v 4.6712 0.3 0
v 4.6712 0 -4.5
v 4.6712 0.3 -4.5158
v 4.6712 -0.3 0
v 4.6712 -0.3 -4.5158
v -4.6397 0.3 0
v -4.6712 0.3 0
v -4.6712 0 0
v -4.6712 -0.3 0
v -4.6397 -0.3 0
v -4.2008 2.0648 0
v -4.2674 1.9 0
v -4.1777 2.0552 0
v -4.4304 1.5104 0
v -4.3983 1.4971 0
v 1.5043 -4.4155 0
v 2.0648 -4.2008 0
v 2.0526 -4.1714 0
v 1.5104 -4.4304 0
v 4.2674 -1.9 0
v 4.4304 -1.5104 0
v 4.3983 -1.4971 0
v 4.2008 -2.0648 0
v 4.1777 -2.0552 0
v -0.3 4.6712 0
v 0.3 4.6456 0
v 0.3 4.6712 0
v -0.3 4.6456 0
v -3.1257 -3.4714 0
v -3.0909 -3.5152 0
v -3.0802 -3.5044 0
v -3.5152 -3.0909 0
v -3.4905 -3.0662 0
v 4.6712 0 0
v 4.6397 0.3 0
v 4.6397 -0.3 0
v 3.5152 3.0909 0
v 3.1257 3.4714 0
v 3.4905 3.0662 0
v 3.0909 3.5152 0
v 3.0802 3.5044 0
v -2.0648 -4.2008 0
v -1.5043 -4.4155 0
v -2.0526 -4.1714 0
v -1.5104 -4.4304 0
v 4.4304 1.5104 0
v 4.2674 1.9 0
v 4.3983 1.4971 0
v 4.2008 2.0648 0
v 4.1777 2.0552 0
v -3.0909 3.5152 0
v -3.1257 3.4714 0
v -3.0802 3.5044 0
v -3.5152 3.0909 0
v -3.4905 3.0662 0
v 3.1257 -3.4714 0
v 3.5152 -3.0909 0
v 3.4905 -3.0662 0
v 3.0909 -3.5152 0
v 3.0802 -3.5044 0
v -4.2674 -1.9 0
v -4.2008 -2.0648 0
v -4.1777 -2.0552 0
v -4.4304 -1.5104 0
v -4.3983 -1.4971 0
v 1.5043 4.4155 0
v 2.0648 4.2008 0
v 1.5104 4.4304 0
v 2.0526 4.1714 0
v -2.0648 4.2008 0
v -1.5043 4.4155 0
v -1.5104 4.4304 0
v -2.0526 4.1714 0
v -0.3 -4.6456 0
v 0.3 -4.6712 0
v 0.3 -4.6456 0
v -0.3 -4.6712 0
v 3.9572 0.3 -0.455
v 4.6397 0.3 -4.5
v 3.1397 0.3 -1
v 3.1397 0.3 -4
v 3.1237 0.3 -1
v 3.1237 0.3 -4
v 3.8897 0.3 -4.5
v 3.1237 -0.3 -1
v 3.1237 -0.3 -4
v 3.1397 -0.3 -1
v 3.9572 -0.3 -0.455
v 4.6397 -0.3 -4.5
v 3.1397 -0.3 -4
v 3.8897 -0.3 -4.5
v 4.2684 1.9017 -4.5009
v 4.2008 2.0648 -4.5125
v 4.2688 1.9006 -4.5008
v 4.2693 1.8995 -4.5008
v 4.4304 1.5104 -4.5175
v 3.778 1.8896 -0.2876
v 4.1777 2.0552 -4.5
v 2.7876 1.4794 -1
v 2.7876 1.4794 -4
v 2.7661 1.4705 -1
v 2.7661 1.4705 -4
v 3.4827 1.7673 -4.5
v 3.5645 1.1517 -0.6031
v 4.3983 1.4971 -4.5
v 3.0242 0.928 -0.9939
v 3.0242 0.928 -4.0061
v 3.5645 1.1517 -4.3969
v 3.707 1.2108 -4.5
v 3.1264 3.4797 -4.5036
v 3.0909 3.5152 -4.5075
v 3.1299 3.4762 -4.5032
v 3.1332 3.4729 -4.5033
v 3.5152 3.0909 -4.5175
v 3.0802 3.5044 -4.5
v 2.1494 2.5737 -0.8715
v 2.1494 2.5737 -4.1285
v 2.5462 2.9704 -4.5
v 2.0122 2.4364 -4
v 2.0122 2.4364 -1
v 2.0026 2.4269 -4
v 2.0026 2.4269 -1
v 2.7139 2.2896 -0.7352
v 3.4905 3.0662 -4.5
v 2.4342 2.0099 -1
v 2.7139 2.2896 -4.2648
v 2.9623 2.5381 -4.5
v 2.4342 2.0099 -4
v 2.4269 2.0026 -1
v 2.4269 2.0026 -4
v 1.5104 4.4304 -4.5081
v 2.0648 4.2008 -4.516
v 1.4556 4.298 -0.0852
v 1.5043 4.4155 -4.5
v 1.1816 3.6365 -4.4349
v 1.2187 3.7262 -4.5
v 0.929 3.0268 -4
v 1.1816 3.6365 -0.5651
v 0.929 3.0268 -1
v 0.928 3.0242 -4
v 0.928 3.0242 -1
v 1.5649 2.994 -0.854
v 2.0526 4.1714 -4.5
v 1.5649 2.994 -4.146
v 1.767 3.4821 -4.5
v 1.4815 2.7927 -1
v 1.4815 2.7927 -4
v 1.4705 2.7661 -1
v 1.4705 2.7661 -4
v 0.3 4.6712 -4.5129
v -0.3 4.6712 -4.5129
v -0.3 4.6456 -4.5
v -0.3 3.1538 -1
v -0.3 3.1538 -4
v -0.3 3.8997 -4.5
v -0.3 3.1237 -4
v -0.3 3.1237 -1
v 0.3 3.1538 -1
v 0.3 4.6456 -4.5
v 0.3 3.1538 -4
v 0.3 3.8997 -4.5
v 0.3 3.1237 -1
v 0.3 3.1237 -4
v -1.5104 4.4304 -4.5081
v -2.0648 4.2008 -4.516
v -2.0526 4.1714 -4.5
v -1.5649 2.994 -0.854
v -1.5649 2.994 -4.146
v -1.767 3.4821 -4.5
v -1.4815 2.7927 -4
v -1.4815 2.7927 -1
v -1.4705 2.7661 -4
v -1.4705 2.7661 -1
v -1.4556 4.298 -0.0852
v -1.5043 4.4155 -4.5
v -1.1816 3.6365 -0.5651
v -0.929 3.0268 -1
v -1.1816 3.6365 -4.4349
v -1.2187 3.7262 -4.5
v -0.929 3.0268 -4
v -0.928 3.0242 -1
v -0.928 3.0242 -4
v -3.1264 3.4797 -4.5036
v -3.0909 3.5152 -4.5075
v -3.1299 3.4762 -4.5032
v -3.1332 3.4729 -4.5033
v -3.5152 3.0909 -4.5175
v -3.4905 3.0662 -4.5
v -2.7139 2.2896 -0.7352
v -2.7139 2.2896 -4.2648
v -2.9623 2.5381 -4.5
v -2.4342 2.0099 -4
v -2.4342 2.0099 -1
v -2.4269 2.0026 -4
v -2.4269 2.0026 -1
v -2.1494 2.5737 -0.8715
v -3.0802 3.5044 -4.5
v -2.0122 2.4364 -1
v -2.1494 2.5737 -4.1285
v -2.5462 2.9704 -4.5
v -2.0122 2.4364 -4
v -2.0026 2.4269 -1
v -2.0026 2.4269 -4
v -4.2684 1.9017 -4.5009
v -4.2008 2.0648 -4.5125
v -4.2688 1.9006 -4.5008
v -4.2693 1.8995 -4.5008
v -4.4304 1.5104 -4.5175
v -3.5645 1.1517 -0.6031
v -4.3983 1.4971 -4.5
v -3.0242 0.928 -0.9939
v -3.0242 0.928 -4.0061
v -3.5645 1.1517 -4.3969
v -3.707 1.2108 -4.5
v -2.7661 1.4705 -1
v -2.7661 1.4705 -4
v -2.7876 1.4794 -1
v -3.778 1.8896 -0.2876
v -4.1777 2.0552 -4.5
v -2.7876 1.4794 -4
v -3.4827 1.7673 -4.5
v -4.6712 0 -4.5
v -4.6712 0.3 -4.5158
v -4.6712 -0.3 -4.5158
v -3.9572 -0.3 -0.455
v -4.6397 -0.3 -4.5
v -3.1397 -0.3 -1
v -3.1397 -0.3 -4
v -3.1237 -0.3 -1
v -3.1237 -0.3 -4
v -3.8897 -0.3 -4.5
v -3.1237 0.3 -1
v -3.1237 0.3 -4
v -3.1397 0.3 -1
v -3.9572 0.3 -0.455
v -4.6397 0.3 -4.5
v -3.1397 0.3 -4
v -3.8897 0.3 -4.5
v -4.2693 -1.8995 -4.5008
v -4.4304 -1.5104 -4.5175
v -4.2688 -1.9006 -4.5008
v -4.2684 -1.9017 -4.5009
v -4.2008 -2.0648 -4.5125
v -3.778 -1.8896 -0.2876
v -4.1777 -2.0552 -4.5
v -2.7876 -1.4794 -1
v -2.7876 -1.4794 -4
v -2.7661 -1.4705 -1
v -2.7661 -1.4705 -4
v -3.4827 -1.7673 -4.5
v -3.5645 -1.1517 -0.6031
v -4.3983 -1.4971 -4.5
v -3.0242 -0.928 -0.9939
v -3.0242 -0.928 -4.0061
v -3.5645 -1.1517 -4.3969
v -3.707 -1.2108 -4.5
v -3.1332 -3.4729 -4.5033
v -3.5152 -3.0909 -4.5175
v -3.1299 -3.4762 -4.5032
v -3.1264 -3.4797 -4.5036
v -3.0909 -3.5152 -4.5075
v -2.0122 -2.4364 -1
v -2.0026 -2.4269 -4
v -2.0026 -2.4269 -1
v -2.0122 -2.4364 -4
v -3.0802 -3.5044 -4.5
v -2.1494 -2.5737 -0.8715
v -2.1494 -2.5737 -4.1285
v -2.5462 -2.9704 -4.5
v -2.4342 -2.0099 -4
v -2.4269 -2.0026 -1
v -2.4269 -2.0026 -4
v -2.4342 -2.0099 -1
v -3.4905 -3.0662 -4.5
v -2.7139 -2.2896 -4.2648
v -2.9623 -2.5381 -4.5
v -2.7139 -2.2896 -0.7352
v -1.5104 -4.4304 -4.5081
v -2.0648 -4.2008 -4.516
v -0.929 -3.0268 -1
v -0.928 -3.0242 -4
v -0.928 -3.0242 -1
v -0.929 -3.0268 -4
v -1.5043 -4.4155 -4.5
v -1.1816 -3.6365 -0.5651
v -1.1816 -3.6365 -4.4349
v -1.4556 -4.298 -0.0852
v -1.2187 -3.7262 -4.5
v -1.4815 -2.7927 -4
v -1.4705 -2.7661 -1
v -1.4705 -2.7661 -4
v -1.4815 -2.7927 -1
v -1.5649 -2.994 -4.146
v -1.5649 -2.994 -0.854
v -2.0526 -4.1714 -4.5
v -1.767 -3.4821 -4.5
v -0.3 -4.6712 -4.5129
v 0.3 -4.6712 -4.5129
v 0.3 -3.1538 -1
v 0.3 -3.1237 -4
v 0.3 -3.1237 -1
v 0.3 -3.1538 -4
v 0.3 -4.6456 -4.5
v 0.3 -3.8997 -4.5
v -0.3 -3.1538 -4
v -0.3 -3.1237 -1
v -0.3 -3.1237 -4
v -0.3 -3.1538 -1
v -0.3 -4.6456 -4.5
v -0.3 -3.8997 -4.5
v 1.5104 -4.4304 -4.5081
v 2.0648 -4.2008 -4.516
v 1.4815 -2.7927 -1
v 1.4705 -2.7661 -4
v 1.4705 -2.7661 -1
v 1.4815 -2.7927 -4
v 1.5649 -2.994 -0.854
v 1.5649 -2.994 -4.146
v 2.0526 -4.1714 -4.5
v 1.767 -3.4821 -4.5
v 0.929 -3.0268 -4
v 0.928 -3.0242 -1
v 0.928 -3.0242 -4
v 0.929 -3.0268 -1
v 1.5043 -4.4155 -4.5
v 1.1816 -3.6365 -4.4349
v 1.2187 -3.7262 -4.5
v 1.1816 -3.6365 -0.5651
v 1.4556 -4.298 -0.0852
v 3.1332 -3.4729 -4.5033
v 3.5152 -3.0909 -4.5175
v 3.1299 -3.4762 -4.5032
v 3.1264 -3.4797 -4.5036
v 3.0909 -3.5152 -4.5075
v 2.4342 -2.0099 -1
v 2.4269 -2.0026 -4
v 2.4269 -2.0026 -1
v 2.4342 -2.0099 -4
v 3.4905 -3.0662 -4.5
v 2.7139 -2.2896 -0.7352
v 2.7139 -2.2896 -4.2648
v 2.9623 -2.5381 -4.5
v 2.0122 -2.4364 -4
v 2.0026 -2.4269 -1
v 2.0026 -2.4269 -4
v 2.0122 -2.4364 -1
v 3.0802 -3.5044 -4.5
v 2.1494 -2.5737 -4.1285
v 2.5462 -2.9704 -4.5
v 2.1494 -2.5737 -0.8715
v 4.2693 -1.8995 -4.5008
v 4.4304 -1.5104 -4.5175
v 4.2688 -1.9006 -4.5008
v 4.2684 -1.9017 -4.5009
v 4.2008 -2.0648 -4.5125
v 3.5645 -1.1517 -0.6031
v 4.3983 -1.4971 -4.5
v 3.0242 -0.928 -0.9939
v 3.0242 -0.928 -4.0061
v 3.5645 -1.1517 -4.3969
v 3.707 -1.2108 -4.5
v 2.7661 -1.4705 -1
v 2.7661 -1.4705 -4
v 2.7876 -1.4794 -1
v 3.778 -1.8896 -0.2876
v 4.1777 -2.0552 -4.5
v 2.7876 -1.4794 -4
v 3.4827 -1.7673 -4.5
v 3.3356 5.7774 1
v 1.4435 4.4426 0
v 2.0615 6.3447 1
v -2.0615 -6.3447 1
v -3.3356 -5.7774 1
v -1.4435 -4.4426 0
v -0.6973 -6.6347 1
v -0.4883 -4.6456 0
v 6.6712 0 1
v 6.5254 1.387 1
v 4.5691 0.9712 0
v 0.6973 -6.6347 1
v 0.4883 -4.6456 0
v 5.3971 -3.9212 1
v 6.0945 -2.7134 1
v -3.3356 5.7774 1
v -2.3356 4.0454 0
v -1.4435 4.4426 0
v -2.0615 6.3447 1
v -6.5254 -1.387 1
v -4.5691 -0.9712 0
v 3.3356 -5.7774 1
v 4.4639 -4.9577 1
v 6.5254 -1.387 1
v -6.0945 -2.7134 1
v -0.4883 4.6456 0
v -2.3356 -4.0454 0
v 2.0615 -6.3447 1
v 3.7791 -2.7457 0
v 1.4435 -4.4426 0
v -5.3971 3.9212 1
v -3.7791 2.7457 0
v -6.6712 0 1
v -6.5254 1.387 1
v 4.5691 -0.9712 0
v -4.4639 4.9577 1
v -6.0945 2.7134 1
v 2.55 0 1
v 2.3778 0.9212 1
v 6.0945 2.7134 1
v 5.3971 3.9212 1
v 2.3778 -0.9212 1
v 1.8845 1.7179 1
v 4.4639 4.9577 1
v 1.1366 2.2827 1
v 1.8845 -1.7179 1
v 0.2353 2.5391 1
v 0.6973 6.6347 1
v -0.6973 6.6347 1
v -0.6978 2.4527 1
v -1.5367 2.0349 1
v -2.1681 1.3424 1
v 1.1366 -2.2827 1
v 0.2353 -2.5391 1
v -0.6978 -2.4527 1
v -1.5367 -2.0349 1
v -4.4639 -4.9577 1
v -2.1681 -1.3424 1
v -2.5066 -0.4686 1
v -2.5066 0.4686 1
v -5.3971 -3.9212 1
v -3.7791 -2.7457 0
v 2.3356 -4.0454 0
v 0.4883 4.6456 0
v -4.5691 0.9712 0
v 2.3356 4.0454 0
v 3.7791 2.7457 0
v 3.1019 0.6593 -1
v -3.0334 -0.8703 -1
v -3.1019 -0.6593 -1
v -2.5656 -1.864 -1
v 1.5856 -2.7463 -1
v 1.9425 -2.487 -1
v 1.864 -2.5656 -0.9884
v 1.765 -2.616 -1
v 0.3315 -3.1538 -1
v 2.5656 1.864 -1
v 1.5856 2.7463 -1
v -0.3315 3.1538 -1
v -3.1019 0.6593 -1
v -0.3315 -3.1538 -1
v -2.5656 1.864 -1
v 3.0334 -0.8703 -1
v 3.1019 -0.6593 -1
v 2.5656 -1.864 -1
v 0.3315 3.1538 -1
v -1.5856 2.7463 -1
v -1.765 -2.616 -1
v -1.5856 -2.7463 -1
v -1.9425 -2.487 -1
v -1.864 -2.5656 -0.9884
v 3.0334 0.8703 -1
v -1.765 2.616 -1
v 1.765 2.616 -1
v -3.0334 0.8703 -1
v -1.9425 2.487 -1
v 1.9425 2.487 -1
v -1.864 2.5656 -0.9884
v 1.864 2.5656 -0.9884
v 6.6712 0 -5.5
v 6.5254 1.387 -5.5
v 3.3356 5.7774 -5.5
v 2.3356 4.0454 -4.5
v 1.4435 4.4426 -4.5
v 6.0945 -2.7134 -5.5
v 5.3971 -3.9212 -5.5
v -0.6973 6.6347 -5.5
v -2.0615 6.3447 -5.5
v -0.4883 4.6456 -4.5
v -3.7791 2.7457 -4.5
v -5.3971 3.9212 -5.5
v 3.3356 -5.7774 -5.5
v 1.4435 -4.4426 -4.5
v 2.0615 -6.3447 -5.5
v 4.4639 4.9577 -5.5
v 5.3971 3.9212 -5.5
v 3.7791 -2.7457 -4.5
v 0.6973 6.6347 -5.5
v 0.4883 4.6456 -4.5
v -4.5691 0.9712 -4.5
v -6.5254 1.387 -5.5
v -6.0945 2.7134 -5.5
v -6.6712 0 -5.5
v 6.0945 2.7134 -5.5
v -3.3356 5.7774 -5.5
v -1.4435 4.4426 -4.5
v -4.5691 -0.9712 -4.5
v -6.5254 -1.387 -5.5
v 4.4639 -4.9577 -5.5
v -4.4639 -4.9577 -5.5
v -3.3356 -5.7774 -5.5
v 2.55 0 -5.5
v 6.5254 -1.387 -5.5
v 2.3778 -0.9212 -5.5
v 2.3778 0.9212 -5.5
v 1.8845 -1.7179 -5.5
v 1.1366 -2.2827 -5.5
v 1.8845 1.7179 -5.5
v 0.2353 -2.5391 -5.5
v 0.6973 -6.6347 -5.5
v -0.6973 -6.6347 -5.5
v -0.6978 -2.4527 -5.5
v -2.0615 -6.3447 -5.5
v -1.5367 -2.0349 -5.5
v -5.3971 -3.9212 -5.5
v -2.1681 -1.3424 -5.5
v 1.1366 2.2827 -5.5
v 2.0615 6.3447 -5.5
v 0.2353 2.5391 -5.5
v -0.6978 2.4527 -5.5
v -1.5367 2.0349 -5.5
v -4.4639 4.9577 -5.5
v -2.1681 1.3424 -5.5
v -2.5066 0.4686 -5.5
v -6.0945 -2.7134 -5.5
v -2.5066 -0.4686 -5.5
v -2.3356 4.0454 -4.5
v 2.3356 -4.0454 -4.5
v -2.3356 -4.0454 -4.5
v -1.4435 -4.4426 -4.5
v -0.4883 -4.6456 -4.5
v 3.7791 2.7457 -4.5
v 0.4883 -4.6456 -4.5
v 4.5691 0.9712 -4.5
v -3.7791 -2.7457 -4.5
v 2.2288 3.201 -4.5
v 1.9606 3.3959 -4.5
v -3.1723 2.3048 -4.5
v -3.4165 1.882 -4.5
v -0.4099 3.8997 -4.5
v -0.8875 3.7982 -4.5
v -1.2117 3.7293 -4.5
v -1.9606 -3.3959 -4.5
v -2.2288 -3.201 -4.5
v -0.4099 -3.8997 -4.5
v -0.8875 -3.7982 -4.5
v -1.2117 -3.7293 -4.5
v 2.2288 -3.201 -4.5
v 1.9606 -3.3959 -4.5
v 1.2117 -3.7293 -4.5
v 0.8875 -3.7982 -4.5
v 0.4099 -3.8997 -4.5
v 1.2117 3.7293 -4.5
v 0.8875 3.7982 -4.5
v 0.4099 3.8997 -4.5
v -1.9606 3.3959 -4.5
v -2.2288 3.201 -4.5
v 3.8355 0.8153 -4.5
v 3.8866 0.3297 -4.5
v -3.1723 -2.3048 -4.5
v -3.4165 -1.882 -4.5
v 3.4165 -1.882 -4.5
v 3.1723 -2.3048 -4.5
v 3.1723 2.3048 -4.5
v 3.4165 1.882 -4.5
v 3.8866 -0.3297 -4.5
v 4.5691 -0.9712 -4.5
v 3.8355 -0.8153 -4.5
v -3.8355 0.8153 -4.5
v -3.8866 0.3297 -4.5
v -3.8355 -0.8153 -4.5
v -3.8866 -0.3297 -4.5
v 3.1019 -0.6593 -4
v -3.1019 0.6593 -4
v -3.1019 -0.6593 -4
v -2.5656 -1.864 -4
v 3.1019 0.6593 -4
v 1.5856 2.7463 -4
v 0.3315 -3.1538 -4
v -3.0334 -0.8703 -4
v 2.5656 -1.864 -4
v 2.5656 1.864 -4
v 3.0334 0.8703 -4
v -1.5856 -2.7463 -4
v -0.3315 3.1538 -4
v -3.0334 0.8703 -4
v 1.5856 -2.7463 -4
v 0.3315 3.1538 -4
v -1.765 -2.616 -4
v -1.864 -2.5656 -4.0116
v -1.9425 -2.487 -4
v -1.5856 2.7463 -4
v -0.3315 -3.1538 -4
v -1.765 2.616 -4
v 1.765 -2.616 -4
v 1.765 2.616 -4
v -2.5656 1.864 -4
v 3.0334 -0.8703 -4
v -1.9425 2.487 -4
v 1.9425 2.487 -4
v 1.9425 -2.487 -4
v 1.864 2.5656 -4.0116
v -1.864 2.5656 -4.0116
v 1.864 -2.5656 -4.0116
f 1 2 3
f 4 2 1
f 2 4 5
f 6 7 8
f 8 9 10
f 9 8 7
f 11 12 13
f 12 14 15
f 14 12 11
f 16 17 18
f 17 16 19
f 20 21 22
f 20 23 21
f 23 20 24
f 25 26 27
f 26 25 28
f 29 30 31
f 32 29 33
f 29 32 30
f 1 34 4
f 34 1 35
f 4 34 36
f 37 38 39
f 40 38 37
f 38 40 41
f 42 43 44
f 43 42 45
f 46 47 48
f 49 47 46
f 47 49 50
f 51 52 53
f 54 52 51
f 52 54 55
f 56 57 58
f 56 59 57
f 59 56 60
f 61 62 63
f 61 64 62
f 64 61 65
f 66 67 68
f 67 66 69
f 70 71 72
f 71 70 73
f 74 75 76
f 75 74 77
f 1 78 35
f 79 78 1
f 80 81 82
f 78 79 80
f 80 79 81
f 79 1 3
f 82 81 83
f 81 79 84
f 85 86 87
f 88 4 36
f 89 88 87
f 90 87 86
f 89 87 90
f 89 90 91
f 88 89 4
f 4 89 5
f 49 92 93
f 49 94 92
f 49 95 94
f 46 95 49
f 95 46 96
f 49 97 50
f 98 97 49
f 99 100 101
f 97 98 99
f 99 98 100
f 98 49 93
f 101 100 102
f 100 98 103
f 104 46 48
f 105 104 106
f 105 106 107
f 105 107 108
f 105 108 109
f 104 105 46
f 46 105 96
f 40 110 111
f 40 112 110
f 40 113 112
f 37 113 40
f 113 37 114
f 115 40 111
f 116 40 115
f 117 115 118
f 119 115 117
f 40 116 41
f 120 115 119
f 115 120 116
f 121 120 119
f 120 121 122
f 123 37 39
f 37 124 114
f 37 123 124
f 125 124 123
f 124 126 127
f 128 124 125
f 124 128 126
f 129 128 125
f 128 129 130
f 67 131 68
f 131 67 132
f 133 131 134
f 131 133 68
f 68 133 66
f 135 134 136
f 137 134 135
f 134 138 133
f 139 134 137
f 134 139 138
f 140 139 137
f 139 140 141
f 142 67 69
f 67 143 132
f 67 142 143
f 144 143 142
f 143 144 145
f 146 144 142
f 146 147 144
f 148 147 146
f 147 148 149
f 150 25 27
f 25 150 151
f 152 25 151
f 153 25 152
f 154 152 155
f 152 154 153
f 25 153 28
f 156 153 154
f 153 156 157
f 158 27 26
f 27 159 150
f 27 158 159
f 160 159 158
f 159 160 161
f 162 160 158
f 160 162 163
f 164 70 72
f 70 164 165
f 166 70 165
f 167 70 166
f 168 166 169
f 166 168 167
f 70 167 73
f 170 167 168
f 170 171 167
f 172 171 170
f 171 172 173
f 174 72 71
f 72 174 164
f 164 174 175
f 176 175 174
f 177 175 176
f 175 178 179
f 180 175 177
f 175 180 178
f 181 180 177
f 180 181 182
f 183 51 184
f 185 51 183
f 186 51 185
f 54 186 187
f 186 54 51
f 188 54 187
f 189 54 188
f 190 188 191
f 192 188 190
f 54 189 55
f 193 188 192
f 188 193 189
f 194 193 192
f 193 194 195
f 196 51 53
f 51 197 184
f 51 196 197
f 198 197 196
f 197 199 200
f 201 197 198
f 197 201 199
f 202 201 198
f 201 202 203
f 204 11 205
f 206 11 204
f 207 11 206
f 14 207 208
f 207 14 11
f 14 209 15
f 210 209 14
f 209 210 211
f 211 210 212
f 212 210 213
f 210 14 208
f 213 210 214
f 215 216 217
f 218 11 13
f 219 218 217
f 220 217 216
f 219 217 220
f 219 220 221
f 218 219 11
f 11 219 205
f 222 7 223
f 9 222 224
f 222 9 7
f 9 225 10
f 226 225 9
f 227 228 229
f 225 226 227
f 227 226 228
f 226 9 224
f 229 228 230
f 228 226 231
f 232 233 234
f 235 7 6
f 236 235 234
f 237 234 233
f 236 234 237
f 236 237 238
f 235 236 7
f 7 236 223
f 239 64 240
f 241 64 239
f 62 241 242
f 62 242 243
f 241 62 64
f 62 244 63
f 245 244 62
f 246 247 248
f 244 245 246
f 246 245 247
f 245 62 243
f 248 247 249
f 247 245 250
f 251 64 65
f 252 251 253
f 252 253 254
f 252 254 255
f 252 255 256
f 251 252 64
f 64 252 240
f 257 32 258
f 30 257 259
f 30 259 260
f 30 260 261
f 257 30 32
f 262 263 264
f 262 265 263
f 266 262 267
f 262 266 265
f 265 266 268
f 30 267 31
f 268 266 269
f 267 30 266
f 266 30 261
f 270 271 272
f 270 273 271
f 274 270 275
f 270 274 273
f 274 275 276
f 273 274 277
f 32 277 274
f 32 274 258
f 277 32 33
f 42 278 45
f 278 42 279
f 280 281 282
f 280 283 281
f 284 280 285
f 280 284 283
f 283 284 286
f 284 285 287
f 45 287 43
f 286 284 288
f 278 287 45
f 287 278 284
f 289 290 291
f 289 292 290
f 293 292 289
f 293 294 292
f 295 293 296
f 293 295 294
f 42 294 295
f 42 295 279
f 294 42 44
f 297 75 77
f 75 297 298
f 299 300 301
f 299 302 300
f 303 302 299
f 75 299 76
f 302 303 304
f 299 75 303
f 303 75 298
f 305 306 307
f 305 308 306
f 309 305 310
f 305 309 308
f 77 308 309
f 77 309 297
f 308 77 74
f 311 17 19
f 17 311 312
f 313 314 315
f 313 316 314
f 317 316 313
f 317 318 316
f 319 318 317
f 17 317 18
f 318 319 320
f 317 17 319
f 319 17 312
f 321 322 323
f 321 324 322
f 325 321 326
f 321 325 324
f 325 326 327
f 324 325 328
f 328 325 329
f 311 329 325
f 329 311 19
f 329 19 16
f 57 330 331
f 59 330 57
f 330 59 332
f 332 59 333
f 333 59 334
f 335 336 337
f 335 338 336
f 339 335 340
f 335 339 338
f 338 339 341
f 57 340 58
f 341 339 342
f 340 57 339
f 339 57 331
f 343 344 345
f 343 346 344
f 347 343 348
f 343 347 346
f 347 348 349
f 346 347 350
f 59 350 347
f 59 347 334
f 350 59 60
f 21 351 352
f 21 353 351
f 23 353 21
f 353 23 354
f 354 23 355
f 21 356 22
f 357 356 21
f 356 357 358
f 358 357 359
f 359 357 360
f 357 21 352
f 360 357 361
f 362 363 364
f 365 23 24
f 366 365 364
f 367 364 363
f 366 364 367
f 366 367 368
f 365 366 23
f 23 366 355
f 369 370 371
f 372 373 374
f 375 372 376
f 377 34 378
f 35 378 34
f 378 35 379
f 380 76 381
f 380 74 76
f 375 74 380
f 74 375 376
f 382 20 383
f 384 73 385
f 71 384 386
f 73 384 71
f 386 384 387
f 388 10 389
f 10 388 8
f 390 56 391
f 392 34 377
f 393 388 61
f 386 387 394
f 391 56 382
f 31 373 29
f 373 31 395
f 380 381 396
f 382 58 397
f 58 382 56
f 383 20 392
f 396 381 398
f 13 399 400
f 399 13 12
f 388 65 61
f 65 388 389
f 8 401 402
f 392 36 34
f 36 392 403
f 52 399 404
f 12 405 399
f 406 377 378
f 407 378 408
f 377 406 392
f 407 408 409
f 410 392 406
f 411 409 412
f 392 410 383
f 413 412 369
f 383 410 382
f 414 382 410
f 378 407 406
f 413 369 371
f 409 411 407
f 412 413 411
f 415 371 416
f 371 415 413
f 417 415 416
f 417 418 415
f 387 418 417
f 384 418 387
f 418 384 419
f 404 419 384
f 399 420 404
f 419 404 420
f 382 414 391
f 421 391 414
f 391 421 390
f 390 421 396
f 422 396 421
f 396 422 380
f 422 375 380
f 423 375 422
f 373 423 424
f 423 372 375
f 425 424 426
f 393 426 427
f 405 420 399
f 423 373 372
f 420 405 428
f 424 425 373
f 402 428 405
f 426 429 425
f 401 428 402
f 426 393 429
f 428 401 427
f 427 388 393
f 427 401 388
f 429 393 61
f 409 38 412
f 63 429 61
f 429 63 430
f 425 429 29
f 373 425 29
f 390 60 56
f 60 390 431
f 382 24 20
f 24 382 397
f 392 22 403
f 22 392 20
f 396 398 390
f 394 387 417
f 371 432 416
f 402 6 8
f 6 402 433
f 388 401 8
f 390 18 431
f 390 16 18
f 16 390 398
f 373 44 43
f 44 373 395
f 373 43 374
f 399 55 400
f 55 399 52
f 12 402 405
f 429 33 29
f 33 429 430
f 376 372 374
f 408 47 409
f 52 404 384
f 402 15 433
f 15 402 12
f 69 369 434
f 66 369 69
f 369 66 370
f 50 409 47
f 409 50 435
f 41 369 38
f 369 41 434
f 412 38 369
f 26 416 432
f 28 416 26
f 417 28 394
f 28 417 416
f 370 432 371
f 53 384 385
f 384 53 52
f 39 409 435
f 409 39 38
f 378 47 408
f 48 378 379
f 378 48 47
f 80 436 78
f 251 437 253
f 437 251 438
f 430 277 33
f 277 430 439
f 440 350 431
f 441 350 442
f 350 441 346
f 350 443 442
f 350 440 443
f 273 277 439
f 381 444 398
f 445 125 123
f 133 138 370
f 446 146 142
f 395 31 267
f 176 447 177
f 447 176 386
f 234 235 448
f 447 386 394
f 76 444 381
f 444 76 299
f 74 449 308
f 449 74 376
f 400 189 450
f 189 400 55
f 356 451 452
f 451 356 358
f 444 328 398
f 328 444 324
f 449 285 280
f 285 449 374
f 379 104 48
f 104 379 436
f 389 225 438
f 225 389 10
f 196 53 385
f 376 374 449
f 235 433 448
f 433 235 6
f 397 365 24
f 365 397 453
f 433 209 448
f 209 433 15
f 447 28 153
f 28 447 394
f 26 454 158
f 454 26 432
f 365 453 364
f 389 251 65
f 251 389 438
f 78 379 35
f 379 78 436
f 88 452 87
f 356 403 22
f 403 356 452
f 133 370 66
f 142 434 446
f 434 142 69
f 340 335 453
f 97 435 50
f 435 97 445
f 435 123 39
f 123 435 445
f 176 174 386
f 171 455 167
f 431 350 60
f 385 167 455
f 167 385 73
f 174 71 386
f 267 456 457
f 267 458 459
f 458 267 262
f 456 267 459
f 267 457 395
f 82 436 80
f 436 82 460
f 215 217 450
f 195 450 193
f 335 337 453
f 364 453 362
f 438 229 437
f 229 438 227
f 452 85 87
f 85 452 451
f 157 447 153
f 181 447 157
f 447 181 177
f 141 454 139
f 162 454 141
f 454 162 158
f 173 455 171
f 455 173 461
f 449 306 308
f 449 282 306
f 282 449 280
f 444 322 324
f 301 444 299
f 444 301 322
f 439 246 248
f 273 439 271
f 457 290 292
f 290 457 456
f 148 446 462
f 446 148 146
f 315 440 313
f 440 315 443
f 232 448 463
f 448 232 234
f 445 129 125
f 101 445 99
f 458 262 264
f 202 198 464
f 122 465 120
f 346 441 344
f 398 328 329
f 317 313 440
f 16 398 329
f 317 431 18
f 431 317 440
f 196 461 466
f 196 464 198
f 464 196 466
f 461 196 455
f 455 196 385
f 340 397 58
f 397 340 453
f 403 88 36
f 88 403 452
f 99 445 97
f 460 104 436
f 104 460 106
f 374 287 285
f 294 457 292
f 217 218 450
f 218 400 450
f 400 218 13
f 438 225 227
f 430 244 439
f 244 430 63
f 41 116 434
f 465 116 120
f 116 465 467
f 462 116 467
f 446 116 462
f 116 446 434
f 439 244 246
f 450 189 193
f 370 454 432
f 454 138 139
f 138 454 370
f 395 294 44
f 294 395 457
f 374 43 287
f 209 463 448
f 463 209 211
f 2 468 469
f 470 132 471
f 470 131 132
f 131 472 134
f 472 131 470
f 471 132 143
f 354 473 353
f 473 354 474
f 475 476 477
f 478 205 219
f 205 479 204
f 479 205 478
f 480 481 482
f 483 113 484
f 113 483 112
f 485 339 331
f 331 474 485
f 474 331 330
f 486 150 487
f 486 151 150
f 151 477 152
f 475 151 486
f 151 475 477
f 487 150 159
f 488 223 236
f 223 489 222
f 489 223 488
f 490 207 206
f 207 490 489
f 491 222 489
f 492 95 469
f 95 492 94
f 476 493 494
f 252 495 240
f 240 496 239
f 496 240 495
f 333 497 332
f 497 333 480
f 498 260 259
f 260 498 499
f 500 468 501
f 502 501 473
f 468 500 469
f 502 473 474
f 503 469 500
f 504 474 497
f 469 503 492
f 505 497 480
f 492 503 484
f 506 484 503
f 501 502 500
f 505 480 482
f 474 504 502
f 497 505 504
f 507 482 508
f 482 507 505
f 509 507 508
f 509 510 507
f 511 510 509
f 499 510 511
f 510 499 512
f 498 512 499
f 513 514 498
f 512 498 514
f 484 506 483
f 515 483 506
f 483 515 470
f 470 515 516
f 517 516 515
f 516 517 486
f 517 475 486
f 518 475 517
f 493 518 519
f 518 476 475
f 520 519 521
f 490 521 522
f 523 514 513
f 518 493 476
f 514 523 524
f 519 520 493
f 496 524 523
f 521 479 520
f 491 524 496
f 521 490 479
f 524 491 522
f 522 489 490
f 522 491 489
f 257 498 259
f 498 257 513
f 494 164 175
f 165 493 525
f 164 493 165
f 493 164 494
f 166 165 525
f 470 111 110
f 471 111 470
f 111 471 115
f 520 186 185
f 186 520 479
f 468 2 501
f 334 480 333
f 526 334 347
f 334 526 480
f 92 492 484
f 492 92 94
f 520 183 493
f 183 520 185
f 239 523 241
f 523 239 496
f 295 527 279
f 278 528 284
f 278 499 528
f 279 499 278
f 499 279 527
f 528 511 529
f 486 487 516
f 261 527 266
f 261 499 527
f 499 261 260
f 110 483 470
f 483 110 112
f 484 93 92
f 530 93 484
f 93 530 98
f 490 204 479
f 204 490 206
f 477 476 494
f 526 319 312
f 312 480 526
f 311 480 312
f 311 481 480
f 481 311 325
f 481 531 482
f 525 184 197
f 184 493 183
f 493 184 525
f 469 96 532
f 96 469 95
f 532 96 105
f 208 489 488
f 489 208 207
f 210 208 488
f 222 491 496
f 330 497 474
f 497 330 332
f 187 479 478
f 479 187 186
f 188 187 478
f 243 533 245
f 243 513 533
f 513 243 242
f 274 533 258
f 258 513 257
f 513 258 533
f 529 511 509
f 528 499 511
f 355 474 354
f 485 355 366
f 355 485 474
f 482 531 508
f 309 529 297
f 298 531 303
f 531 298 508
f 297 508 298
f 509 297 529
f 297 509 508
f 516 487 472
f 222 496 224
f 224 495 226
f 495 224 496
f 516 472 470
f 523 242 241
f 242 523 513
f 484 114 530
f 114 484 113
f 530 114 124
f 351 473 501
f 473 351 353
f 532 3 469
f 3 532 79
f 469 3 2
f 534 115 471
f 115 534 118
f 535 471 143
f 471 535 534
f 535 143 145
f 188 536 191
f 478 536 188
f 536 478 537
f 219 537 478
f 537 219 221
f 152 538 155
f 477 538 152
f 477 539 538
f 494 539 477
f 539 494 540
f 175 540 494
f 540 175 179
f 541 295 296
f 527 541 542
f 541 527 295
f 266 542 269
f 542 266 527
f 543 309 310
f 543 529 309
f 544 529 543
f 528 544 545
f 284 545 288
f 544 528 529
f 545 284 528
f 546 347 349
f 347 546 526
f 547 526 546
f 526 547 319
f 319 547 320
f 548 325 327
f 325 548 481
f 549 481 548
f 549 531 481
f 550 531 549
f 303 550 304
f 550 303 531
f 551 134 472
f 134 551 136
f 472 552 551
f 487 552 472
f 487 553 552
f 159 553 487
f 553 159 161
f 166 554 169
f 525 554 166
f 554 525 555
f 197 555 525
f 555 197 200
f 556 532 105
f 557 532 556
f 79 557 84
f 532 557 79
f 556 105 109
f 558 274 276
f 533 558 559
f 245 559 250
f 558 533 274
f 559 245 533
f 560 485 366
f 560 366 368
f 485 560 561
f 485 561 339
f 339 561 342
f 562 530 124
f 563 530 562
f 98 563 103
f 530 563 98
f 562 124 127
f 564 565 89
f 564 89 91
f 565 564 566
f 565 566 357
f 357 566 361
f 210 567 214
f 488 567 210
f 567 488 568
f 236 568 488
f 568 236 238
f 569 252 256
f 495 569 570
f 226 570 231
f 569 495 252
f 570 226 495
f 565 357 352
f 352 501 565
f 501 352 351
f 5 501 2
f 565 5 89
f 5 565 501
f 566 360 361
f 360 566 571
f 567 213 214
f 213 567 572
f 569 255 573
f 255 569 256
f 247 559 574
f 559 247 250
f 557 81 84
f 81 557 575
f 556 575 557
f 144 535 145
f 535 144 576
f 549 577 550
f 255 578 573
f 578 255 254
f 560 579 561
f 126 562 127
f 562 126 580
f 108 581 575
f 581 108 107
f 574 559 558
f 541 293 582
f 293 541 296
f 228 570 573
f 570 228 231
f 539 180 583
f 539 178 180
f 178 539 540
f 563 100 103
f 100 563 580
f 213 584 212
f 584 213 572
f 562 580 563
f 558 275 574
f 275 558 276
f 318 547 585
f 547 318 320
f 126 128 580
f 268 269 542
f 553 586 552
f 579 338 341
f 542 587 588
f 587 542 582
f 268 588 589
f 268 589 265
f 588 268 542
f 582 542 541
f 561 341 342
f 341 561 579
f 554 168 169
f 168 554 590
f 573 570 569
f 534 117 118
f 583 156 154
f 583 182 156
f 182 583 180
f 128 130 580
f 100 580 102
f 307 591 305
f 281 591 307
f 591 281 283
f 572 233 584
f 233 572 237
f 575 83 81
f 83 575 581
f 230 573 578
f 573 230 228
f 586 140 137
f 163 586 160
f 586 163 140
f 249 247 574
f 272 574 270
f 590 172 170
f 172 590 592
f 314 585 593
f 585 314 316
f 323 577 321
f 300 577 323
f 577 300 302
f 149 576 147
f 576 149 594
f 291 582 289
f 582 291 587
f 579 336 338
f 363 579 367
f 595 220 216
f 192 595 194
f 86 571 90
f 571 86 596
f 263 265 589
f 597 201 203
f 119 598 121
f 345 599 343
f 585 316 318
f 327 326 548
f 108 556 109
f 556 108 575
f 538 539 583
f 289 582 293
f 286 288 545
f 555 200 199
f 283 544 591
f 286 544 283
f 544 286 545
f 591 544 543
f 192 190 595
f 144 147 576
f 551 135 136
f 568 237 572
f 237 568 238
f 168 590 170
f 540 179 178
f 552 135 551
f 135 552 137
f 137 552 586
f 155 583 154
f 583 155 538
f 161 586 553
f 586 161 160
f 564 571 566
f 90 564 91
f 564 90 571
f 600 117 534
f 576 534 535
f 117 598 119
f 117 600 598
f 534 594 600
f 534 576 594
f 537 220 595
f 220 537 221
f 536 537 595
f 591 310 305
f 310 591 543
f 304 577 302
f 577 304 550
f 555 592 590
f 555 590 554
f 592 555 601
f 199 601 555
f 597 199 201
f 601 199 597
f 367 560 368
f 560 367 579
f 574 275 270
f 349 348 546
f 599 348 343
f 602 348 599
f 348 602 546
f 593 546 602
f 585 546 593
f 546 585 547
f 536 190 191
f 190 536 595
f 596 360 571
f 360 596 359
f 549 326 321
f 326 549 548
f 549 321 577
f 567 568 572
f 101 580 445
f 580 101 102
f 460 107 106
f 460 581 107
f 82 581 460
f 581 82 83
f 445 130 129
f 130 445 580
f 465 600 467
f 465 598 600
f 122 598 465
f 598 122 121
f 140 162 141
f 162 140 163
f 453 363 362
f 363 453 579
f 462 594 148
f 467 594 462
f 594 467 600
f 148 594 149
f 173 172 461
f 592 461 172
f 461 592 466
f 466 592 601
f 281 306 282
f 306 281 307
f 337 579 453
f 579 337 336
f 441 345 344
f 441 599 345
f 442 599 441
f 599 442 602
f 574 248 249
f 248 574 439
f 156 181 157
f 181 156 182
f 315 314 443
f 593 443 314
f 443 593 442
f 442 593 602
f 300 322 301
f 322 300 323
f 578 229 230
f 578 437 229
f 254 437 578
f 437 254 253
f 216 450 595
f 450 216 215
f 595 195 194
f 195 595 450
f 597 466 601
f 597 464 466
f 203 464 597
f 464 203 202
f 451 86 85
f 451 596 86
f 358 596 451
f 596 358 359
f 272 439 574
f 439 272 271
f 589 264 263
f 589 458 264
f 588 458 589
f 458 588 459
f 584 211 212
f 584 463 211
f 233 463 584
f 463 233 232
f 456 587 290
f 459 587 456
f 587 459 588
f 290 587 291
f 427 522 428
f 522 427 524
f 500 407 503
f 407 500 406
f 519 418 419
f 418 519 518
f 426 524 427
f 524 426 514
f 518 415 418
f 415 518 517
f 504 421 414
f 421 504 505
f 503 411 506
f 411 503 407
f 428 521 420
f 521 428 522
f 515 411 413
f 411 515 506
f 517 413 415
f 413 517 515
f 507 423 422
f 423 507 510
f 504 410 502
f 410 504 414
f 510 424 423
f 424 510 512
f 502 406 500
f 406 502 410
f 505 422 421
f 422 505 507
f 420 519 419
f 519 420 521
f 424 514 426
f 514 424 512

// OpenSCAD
// By Erik de Bruijn <reprap@erikdebruijn.nl>
// License: GPLv2 or later
// Modified by James Newton <jamesnewton@massmind.org>
// 2012/05/31 Corrected issue with setscrew holes poking all the way through the opposite side of the hub.
// the teardrop height must be half the hubDiameter and then the hole has to be translated out to the shaftDiameter
// Also added hubSetScrewAngle so the setscrew holes can be angled for use of the pully on drill press handels
// where the handles come out at an angle. This allows the drill press to be automated as part of a CNC conversion.
// Minor corrections... Also probably introduced minor errors.
//
// Goal: the goal of this parametric model is to generate a high quality custom timing pulley that is printable without support material.
// NOTE: The diameter of the gear parts are determined by the belt's pitch and number of teeth on a pully.
// updates:
// numSetScrews allows you to specify multiple set screws, 1 or 3 are useful values. With 3 you will be able to center the axis.

// //////////////////////////////
// USER PARAMETERS
// //////////////////////////////

// Pulley properties
shaftDiameter = 5.1; //8 the shaft at the center, will be subtracted from the pulley. Better be too small than too wide.
hubDiameter = 10; //13 if the hub or timing pulley is big enough to fit a nut, this will be embedded.
hubHeight = 8; //10 the hub is the thick cylinder connected to the pulley to allow a set screw to go through or as a collar for a nut.
flanges = 1; // the rims that keep the belt from going anywhere
hubSetScrewDiameter = 3; // use either a set screw or nut on a shaft. Set to 0 to not use a set screw.
hubSetScrewAngle = 90; //change from 90 to angle the setscrews
numSetScrews = 1;
numTeeth = 16; // this value together with the pitch determines the pulley diameter
toothType = 3; // 1 = slightly rounded, 2 = oval sharp, 3 = square. For square, set the toothWith a little low.

// Belt properties:
pitch = 2.07; //5 distance between the teeth
beltWidth = 3; //4 the width/height of the belt. The (vertical) size of the pulley is adapted to this.
beltThickness = .6; //.65 thickness of the part excluding the notch depth!
notchDepth = 1.5; //1.8 make it slightly bigger than actual, there's an outward curvature in the inner solid part of the pulley
toothWidth = .6; // Teeth of the PULLEY, that is.

// //////////////////////////////
// Includes
// //////////////////////////////
include <MCAD/teardrop.scad>
// See the bottom of the script to comment it out if you don't want to use this include!
//

// //////////////////////////////
// OpenSCAD SCRIPT
// //////////////////////////////

PI = 3.14159265;
$fs=1; // def 1, 0.2 is high res
$fa=12;//def 12, 3 is very nice

pulleyDiameter = pitch*numTeeth/PI;

if(hubSetScrewDiameter >= 1) // 
{
	echo("set screw, no nut");
	timingPulley( pitch,beltWidth,beltThickness,notchDepth,numTeeth,flanges, shaftDiameter,hubDiameter,hubHeight,hubSetScrewDiameter);
}

if(hubSetScrewDiameter == 0) // use a nut
{
echo("use a nut");
if(pulleyDiameter >= hubDiameter) // no hub needed
{
	echo("no hub needed");
	difference()
	{
		timingPulley(
			pitch,beltWidth,beltThickness,notchDepth,numTeeth,flanges,shaftDiameter,hubDiameter,0,hubSetScrewDiameter
		);
		translate([0,0,-6]) nut(8,8);
	}
}
if(pulleyDiameter < hubDiameter)
{
	echo("hub is needed");
	difference()
	{
		timingPulley(
			pitch,beltWidth,beltThickness,notchDepth,numTeeth,flanges,shaftDiameter,hubDiameter,hubHeight,hubSetScrewDiameter
		);
		translate([0,0,8]) nut(8,12);
	}
}
}

// also in ~/RepRap/Object Files/nuts.scad
module nut(nutSize,height)
{
// Based on some random measurements:
// M3 = 5.36
// M5 = 7.85
// M8 = 12.87
	hexSize = nutSize + 12.67 - 8; // only checked this for M8 hex nuts!!
	union()
	{
		 for(i=[0:5])
		{
			intersection()
			{
				rotate([0,0,60*i]) translate([0,-hexSize/2,0]) cube([hexSize/2,hexSize,height]);
				rotate([0,0,60*(i+1)]) translate([0,-hexSize/2,0]) cube([hexSize/2,hexSize,height]);
			}
		}
	}
}


module timingPulley(
	pitch, beltWidth, beltThickness, notchDepth, numTeeth, flanges, shaftDiameter, hubDiameter, hubHeight, hubSetScrewDiameter
) {
	totalHeight = beltWidth + flanges*4 + hubHeight;

	difference()
	{
		union()
		{
			timingGear(pitch,beltWidth,beltThickness,numTeeth,notchDepth,flanges);
			//hub(hubDiameter,hubHeight,hubSetScrewDiameter);
		}
		shaft(totalHeight*2,shaftDiameter);
	}




	module shaft(shaftHeight, shaftDiameter)
	{
		cylinder(h = shaftHeight, r = shaftDiameter/2, center =true);
	}


	module timingGear(pitch,beltWidth,beltThickness,numTeeth,notchDepth,flanges)
	{
		flangeHeight = 0;
		//if(flanges==1)
		{
			flangeHeight = 1;
		}
		
		toothHeight = beltWidth+flangeHeight*2;
		circumference = numTeeth*pitch;
		outerRadius = circumference/PI/2-beltThickness;
		innerRadius = circumference/PI/2-notchDepth-beltThickness;

		union()
		{
			//solid part of gear
			translate([0,0,-toothHeight]) cylinder(h = toothHeight, r = innerRadius, center =false);
			//teeth part of gear
			translate([0,0,-toothHeight/2]) teeth(pitch,numTeeth,toothWidth,notchDepth,toothHeight);
	
			// flanges:
			if(flanges>=1)
			{
				//top flange
				translate([0,0,0]) cylinder(h = 1, r1=outerRadius,r2=outerRadius+2);
				//translate([0,0,0]) cylinder(h = 1, r=outerRadius+3);
				translate([0,0,-flangeHeight]) cylinder(h = flangeHeight, r2=outerRadius,r1=innerRadius);
				//bottom flange
				translate([0,0,-toothHeight-0.5]) cylinder(h = 1, r2=outerRadius,r1=outerRadius+2);
				translate([0,0,-toothHeight]) cylinder(h = flangeHeight, r1=outerRadius,r2=innerRadius);
			}
		}

	}

	module teeth(pitch,numTeeth,toothWidth,notchDepth,toothHeight)
	{
		// teeth are apart by the 'pitch' distance
		// this determines the outer radius of the teeth
		circumference = numTeeth*pitch;
		outerRadius = circumference/PI/2-beltThickness;
		innerRadius = circumference/PI/2-notchDepth-beltThickness;
		echo("Teeth diameter is: ", outerRadius*2);
		echo("Pulley inside of teeth radius is: ", innerRadius*2);
		
		for(i = [0:numTeeth-1])
		{
			rotate([0,0,i*360/numTeeth]) translate([innerRadius,0,0]) 
				tooth(toothWidth,notchDepth, toothHeight,toothType);
		}
	}
	module tooth(toothWidth,notchDepth, toothHeight,toothType)
	{
		if(toothType == 1)
		{
			union()
			{
				translate([notchDepth*0.25,0,0]) 
					cube(size = [notchDepth,toothWidth,toothHeight],center = true);
		  		translate([notchDepth*0.75,0,0]) scale([notchDepth/4, toothWidth/2, 1]) 
					cylinder(h = toothHeight, r = 1, center=true);
			}
		}
		if(toothType == 2)
			scale([notchDepth, toothWidth/2, 1]) cylinder(h = toothHeight, r = 1, center=true);

		if(toothType == 3)
		{
			union()
			{
				translate([notchDepth*0.5-1,0,0]) cube(size = [notchDepth+2,toothWidth,toothHeight],center = true);
		  		scale([notchDepth/4, toothWidth/2, 1]) cylinder(h = toothHeight, r = 1, center=true);
			}
		}
	}

	module hub(hubDiameter,hubHeight,hubSetScrewDiameter)
	{
		if(hubSetScrewDiameter == 0)
		{
			cylinder(h = hubHeight, r = hubDiameter/2, center =false);
		}
		if(hubSetScrewDiameter > 0)
		{
			difference()
			{
				
				cylinder(h = hubHeight, r = hubDiameter/2, center =false);
				for(rotZ=[1:numSetScrews])
					rotate([0,0,360*(rotZ/numSetScrews)]) translate([shaftDiameter/1.9,0,hubHeight/2]) rotate([0,hubSetScrewAngle,0]) 
						teardrop(hubSetScrewDiameter/2, hubDiameter/1.9,true);
			}
		}
	}


}


/* include: module teardrop(radius,height,truncated)
module teardrop(radius,height,truncated)
{
	truncateMM = 1;
	union()
	{
		if(truncated == true)
		{
		intersection()
		{
		translate([0,0,height/2]) scale([1,1,height]) rotate([0,0,180]) cube([radius*2.5,radius*2,1],center=true);
		scale([1,1,height]) rotate([0,0,3*45]) cube([radius,radius,1]);
		}
		}
		if(truncated == false)
		{
		scale([1,1,height]) rotate([0,0,3*45]) cube([radius,radius,1]);
		}
		#cylinder(r=radius, h = height);
	}
}
*/
